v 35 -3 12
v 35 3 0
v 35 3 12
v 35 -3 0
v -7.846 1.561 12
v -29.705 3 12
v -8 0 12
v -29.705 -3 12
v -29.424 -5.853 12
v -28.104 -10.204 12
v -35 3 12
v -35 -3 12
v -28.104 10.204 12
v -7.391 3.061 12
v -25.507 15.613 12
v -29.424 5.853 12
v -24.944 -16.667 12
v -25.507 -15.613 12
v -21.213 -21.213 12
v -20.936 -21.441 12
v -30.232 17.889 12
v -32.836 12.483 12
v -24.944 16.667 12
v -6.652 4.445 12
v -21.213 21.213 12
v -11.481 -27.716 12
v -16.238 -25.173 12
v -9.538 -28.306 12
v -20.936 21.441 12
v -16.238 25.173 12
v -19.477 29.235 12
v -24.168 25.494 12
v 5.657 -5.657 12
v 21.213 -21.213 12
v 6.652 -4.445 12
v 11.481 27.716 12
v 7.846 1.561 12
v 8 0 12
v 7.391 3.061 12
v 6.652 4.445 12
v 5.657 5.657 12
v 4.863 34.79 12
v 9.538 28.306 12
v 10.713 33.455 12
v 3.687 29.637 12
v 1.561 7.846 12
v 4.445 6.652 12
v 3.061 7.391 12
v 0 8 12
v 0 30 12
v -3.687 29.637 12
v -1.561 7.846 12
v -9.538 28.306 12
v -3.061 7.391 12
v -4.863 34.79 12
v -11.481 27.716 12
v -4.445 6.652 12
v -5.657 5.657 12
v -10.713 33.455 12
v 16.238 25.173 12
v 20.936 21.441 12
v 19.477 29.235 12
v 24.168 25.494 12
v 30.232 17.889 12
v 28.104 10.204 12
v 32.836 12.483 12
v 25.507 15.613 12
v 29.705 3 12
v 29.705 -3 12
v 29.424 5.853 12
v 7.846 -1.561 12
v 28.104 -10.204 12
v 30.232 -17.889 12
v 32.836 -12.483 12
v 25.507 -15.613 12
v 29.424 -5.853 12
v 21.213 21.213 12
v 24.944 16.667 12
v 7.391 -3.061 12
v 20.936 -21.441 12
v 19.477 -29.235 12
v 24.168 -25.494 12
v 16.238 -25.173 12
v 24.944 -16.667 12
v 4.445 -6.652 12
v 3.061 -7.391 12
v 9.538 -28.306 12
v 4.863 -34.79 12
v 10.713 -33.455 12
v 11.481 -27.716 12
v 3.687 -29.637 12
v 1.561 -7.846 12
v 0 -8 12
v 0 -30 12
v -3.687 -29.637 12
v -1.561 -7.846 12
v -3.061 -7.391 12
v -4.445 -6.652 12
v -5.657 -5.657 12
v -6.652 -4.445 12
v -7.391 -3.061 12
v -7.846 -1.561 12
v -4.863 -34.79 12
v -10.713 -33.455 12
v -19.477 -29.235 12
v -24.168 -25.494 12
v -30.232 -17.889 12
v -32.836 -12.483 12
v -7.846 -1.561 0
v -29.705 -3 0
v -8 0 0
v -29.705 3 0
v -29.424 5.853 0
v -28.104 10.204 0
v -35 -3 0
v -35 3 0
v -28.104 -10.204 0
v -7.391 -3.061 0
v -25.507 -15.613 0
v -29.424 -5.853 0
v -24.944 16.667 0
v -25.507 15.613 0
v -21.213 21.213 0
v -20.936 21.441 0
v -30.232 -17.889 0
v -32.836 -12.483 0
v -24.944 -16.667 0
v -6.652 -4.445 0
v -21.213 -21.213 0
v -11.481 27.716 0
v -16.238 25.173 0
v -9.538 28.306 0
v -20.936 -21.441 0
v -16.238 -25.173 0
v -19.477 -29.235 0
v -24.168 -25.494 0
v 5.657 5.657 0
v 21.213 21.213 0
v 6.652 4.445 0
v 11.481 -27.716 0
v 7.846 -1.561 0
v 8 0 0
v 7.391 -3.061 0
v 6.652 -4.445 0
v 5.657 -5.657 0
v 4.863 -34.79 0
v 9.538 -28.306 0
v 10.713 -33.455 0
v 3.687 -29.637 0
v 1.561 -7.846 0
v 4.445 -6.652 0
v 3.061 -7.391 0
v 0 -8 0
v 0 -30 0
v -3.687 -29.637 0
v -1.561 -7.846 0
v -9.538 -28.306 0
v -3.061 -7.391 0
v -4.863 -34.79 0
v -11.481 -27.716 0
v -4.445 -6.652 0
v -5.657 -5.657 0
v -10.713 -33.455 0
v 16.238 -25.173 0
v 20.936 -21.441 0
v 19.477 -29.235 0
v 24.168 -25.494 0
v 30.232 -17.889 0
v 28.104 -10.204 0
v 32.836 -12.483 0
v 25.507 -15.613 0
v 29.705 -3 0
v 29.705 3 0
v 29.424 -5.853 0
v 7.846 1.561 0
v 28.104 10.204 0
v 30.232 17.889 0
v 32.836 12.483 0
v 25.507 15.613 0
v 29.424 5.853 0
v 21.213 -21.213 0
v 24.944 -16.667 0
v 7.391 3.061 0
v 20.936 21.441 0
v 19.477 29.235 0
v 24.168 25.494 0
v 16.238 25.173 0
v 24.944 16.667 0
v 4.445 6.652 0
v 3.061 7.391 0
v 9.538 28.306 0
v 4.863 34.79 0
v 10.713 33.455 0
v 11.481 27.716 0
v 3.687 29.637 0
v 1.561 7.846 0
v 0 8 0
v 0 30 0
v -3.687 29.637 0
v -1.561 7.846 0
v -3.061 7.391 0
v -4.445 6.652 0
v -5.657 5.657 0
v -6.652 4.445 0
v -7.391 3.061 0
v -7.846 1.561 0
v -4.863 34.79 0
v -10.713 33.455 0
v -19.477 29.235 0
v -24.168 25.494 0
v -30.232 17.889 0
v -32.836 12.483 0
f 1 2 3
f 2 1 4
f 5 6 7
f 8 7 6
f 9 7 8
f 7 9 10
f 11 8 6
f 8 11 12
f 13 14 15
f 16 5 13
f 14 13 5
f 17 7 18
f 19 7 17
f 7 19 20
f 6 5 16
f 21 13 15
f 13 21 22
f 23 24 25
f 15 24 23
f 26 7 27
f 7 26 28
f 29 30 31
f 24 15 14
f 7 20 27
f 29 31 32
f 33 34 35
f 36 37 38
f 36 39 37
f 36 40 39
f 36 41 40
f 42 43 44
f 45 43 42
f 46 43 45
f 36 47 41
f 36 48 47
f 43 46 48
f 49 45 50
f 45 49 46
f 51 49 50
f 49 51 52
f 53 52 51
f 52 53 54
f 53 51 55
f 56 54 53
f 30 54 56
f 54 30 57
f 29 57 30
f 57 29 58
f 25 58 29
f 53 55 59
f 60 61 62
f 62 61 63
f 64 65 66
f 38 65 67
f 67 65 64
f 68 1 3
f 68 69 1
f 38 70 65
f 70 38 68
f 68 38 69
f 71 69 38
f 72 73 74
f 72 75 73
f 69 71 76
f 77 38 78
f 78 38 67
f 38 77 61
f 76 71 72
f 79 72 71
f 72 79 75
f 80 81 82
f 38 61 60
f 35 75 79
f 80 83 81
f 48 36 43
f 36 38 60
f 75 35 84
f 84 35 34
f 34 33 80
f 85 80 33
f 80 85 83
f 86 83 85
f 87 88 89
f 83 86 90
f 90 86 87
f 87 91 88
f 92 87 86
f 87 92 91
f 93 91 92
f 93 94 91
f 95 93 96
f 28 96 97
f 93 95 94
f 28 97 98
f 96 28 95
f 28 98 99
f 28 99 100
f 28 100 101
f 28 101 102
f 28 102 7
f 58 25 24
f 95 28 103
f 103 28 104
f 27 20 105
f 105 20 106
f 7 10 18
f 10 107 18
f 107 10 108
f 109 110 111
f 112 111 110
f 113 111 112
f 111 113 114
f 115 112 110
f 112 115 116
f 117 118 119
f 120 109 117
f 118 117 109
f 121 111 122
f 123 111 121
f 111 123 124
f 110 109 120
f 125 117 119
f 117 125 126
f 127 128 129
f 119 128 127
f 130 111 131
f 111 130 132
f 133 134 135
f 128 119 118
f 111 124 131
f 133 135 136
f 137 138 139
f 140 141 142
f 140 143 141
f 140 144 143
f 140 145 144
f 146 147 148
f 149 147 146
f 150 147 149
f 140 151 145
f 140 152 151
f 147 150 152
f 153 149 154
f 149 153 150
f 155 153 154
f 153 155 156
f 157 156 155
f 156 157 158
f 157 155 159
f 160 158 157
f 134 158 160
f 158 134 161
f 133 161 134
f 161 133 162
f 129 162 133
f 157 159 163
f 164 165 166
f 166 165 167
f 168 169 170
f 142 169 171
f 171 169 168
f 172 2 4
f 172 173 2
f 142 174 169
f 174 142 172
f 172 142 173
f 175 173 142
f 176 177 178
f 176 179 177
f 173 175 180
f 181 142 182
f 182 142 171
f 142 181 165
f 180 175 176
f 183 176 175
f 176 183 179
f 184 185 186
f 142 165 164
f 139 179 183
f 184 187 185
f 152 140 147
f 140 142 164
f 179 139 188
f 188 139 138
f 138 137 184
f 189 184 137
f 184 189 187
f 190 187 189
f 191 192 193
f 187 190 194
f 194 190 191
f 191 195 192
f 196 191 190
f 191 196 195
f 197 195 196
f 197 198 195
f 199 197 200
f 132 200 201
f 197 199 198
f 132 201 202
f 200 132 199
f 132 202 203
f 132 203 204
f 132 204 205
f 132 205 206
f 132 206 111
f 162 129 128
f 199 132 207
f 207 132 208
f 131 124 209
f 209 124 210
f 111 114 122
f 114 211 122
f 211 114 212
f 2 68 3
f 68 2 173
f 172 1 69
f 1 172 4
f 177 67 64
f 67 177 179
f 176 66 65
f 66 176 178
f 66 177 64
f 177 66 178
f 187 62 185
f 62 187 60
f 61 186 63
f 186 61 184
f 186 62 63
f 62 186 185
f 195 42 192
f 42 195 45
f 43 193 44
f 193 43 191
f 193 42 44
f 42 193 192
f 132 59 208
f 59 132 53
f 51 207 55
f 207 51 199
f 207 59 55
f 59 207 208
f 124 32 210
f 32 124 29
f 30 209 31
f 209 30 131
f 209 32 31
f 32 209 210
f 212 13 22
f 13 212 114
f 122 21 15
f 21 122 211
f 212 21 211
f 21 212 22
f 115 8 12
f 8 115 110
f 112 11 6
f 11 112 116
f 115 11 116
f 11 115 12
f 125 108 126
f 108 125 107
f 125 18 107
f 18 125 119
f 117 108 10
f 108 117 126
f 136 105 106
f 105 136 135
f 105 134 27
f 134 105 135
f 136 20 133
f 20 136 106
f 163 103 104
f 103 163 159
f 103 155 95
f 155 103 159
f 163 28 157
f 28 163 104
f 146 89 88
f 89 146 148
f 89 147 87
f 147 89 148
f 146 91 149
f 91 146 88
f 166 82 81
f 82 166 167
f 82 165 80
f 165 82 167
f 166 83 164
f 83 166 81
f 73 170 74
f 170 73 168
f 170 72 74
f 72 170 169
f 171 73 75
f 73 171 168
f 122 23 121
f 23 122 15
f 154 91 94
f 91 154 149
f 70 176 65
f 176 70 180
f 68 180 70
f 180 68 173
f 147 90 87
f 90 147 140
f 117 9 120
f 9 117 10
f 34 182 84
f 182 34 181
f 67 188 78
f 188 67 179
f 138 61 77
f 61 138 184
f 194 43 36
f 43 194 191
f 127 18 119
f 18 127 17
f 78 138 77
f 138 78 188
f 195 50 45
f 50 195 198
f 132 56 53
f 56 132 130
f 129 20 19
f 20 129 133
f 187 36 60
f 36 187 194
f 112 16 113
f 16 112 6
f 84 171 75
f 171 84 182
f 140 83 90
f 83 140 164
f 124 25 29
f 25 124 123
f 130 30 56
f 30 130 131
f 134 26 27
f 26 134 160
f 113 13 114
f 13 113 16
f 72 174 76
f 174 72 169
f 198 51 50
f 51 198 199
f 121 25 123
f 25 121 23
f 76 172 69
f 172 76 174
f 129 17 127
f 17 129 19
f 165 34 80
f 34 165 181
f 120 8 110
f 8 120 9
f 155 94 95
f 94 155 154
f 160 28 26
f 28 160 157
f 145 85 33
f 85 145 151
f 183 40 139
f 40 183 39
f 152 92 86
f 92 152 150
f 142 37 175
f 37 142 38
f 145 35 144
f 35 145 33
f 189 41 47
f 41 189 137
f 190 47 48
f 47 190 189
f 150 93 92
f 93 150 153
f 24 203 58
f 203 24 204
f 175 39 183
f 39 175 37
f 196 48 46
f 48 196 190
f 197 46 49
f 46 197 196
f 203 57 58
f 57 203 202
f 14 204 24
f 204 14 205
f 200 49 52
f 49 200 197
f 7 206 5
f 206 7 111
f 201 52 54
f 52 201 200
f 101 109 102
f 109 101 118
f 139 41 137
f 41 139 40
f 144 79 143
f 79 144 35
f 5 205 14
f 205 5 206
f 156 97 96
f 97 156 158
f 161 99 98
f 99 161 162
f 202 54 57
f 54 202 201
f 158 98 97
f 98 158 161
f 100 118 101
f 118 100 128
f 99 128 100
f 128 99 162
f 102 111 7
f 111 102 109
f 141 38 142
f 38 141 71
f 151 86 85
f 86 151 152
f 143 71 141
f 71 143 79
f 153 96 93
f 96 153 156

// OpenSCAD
$fn = 32;

// ----------------------------------------------------------------------
// Spur blank: bored gear blank
// ----------------------------------------------------------------------

// --- parameters (mm) ---
disc_r = 30;              // blank root radius
disc_t = 12;              // blank thickness
n_teeth = 14;             // stub tooth count
tooth_w = 6;              // tooth width at the root
tooth_h = 5;              // tooth height above the root
bore_r = 8;               // central bore radius
fit_tol = 0.05;           // tolerance for press fits, mm
free_tol = 0.3;           // tolerance for clearance fits, mm

out_r = disc_r + tooth_h;  // tip radius
bbox_x = 70.0;  // measured width over the teeth
bbox_y = 69.58;  // measured depth over the teeth

difference() {
union() {
  cylinder(r = disc_r, h = disc_t);
  for (i = [0 : n_teeth - 1])
    rotate([0, 0, i * 360 / n_teeth])
      translate([disc_r - 1, -tooth_w / 2, 0])
        cube([tooth_h + 1, tooth_w, disc_t]);
}
  translate([0, 0, -1]) cylinder(r = bore_r, h = disc_t + 2);
}
